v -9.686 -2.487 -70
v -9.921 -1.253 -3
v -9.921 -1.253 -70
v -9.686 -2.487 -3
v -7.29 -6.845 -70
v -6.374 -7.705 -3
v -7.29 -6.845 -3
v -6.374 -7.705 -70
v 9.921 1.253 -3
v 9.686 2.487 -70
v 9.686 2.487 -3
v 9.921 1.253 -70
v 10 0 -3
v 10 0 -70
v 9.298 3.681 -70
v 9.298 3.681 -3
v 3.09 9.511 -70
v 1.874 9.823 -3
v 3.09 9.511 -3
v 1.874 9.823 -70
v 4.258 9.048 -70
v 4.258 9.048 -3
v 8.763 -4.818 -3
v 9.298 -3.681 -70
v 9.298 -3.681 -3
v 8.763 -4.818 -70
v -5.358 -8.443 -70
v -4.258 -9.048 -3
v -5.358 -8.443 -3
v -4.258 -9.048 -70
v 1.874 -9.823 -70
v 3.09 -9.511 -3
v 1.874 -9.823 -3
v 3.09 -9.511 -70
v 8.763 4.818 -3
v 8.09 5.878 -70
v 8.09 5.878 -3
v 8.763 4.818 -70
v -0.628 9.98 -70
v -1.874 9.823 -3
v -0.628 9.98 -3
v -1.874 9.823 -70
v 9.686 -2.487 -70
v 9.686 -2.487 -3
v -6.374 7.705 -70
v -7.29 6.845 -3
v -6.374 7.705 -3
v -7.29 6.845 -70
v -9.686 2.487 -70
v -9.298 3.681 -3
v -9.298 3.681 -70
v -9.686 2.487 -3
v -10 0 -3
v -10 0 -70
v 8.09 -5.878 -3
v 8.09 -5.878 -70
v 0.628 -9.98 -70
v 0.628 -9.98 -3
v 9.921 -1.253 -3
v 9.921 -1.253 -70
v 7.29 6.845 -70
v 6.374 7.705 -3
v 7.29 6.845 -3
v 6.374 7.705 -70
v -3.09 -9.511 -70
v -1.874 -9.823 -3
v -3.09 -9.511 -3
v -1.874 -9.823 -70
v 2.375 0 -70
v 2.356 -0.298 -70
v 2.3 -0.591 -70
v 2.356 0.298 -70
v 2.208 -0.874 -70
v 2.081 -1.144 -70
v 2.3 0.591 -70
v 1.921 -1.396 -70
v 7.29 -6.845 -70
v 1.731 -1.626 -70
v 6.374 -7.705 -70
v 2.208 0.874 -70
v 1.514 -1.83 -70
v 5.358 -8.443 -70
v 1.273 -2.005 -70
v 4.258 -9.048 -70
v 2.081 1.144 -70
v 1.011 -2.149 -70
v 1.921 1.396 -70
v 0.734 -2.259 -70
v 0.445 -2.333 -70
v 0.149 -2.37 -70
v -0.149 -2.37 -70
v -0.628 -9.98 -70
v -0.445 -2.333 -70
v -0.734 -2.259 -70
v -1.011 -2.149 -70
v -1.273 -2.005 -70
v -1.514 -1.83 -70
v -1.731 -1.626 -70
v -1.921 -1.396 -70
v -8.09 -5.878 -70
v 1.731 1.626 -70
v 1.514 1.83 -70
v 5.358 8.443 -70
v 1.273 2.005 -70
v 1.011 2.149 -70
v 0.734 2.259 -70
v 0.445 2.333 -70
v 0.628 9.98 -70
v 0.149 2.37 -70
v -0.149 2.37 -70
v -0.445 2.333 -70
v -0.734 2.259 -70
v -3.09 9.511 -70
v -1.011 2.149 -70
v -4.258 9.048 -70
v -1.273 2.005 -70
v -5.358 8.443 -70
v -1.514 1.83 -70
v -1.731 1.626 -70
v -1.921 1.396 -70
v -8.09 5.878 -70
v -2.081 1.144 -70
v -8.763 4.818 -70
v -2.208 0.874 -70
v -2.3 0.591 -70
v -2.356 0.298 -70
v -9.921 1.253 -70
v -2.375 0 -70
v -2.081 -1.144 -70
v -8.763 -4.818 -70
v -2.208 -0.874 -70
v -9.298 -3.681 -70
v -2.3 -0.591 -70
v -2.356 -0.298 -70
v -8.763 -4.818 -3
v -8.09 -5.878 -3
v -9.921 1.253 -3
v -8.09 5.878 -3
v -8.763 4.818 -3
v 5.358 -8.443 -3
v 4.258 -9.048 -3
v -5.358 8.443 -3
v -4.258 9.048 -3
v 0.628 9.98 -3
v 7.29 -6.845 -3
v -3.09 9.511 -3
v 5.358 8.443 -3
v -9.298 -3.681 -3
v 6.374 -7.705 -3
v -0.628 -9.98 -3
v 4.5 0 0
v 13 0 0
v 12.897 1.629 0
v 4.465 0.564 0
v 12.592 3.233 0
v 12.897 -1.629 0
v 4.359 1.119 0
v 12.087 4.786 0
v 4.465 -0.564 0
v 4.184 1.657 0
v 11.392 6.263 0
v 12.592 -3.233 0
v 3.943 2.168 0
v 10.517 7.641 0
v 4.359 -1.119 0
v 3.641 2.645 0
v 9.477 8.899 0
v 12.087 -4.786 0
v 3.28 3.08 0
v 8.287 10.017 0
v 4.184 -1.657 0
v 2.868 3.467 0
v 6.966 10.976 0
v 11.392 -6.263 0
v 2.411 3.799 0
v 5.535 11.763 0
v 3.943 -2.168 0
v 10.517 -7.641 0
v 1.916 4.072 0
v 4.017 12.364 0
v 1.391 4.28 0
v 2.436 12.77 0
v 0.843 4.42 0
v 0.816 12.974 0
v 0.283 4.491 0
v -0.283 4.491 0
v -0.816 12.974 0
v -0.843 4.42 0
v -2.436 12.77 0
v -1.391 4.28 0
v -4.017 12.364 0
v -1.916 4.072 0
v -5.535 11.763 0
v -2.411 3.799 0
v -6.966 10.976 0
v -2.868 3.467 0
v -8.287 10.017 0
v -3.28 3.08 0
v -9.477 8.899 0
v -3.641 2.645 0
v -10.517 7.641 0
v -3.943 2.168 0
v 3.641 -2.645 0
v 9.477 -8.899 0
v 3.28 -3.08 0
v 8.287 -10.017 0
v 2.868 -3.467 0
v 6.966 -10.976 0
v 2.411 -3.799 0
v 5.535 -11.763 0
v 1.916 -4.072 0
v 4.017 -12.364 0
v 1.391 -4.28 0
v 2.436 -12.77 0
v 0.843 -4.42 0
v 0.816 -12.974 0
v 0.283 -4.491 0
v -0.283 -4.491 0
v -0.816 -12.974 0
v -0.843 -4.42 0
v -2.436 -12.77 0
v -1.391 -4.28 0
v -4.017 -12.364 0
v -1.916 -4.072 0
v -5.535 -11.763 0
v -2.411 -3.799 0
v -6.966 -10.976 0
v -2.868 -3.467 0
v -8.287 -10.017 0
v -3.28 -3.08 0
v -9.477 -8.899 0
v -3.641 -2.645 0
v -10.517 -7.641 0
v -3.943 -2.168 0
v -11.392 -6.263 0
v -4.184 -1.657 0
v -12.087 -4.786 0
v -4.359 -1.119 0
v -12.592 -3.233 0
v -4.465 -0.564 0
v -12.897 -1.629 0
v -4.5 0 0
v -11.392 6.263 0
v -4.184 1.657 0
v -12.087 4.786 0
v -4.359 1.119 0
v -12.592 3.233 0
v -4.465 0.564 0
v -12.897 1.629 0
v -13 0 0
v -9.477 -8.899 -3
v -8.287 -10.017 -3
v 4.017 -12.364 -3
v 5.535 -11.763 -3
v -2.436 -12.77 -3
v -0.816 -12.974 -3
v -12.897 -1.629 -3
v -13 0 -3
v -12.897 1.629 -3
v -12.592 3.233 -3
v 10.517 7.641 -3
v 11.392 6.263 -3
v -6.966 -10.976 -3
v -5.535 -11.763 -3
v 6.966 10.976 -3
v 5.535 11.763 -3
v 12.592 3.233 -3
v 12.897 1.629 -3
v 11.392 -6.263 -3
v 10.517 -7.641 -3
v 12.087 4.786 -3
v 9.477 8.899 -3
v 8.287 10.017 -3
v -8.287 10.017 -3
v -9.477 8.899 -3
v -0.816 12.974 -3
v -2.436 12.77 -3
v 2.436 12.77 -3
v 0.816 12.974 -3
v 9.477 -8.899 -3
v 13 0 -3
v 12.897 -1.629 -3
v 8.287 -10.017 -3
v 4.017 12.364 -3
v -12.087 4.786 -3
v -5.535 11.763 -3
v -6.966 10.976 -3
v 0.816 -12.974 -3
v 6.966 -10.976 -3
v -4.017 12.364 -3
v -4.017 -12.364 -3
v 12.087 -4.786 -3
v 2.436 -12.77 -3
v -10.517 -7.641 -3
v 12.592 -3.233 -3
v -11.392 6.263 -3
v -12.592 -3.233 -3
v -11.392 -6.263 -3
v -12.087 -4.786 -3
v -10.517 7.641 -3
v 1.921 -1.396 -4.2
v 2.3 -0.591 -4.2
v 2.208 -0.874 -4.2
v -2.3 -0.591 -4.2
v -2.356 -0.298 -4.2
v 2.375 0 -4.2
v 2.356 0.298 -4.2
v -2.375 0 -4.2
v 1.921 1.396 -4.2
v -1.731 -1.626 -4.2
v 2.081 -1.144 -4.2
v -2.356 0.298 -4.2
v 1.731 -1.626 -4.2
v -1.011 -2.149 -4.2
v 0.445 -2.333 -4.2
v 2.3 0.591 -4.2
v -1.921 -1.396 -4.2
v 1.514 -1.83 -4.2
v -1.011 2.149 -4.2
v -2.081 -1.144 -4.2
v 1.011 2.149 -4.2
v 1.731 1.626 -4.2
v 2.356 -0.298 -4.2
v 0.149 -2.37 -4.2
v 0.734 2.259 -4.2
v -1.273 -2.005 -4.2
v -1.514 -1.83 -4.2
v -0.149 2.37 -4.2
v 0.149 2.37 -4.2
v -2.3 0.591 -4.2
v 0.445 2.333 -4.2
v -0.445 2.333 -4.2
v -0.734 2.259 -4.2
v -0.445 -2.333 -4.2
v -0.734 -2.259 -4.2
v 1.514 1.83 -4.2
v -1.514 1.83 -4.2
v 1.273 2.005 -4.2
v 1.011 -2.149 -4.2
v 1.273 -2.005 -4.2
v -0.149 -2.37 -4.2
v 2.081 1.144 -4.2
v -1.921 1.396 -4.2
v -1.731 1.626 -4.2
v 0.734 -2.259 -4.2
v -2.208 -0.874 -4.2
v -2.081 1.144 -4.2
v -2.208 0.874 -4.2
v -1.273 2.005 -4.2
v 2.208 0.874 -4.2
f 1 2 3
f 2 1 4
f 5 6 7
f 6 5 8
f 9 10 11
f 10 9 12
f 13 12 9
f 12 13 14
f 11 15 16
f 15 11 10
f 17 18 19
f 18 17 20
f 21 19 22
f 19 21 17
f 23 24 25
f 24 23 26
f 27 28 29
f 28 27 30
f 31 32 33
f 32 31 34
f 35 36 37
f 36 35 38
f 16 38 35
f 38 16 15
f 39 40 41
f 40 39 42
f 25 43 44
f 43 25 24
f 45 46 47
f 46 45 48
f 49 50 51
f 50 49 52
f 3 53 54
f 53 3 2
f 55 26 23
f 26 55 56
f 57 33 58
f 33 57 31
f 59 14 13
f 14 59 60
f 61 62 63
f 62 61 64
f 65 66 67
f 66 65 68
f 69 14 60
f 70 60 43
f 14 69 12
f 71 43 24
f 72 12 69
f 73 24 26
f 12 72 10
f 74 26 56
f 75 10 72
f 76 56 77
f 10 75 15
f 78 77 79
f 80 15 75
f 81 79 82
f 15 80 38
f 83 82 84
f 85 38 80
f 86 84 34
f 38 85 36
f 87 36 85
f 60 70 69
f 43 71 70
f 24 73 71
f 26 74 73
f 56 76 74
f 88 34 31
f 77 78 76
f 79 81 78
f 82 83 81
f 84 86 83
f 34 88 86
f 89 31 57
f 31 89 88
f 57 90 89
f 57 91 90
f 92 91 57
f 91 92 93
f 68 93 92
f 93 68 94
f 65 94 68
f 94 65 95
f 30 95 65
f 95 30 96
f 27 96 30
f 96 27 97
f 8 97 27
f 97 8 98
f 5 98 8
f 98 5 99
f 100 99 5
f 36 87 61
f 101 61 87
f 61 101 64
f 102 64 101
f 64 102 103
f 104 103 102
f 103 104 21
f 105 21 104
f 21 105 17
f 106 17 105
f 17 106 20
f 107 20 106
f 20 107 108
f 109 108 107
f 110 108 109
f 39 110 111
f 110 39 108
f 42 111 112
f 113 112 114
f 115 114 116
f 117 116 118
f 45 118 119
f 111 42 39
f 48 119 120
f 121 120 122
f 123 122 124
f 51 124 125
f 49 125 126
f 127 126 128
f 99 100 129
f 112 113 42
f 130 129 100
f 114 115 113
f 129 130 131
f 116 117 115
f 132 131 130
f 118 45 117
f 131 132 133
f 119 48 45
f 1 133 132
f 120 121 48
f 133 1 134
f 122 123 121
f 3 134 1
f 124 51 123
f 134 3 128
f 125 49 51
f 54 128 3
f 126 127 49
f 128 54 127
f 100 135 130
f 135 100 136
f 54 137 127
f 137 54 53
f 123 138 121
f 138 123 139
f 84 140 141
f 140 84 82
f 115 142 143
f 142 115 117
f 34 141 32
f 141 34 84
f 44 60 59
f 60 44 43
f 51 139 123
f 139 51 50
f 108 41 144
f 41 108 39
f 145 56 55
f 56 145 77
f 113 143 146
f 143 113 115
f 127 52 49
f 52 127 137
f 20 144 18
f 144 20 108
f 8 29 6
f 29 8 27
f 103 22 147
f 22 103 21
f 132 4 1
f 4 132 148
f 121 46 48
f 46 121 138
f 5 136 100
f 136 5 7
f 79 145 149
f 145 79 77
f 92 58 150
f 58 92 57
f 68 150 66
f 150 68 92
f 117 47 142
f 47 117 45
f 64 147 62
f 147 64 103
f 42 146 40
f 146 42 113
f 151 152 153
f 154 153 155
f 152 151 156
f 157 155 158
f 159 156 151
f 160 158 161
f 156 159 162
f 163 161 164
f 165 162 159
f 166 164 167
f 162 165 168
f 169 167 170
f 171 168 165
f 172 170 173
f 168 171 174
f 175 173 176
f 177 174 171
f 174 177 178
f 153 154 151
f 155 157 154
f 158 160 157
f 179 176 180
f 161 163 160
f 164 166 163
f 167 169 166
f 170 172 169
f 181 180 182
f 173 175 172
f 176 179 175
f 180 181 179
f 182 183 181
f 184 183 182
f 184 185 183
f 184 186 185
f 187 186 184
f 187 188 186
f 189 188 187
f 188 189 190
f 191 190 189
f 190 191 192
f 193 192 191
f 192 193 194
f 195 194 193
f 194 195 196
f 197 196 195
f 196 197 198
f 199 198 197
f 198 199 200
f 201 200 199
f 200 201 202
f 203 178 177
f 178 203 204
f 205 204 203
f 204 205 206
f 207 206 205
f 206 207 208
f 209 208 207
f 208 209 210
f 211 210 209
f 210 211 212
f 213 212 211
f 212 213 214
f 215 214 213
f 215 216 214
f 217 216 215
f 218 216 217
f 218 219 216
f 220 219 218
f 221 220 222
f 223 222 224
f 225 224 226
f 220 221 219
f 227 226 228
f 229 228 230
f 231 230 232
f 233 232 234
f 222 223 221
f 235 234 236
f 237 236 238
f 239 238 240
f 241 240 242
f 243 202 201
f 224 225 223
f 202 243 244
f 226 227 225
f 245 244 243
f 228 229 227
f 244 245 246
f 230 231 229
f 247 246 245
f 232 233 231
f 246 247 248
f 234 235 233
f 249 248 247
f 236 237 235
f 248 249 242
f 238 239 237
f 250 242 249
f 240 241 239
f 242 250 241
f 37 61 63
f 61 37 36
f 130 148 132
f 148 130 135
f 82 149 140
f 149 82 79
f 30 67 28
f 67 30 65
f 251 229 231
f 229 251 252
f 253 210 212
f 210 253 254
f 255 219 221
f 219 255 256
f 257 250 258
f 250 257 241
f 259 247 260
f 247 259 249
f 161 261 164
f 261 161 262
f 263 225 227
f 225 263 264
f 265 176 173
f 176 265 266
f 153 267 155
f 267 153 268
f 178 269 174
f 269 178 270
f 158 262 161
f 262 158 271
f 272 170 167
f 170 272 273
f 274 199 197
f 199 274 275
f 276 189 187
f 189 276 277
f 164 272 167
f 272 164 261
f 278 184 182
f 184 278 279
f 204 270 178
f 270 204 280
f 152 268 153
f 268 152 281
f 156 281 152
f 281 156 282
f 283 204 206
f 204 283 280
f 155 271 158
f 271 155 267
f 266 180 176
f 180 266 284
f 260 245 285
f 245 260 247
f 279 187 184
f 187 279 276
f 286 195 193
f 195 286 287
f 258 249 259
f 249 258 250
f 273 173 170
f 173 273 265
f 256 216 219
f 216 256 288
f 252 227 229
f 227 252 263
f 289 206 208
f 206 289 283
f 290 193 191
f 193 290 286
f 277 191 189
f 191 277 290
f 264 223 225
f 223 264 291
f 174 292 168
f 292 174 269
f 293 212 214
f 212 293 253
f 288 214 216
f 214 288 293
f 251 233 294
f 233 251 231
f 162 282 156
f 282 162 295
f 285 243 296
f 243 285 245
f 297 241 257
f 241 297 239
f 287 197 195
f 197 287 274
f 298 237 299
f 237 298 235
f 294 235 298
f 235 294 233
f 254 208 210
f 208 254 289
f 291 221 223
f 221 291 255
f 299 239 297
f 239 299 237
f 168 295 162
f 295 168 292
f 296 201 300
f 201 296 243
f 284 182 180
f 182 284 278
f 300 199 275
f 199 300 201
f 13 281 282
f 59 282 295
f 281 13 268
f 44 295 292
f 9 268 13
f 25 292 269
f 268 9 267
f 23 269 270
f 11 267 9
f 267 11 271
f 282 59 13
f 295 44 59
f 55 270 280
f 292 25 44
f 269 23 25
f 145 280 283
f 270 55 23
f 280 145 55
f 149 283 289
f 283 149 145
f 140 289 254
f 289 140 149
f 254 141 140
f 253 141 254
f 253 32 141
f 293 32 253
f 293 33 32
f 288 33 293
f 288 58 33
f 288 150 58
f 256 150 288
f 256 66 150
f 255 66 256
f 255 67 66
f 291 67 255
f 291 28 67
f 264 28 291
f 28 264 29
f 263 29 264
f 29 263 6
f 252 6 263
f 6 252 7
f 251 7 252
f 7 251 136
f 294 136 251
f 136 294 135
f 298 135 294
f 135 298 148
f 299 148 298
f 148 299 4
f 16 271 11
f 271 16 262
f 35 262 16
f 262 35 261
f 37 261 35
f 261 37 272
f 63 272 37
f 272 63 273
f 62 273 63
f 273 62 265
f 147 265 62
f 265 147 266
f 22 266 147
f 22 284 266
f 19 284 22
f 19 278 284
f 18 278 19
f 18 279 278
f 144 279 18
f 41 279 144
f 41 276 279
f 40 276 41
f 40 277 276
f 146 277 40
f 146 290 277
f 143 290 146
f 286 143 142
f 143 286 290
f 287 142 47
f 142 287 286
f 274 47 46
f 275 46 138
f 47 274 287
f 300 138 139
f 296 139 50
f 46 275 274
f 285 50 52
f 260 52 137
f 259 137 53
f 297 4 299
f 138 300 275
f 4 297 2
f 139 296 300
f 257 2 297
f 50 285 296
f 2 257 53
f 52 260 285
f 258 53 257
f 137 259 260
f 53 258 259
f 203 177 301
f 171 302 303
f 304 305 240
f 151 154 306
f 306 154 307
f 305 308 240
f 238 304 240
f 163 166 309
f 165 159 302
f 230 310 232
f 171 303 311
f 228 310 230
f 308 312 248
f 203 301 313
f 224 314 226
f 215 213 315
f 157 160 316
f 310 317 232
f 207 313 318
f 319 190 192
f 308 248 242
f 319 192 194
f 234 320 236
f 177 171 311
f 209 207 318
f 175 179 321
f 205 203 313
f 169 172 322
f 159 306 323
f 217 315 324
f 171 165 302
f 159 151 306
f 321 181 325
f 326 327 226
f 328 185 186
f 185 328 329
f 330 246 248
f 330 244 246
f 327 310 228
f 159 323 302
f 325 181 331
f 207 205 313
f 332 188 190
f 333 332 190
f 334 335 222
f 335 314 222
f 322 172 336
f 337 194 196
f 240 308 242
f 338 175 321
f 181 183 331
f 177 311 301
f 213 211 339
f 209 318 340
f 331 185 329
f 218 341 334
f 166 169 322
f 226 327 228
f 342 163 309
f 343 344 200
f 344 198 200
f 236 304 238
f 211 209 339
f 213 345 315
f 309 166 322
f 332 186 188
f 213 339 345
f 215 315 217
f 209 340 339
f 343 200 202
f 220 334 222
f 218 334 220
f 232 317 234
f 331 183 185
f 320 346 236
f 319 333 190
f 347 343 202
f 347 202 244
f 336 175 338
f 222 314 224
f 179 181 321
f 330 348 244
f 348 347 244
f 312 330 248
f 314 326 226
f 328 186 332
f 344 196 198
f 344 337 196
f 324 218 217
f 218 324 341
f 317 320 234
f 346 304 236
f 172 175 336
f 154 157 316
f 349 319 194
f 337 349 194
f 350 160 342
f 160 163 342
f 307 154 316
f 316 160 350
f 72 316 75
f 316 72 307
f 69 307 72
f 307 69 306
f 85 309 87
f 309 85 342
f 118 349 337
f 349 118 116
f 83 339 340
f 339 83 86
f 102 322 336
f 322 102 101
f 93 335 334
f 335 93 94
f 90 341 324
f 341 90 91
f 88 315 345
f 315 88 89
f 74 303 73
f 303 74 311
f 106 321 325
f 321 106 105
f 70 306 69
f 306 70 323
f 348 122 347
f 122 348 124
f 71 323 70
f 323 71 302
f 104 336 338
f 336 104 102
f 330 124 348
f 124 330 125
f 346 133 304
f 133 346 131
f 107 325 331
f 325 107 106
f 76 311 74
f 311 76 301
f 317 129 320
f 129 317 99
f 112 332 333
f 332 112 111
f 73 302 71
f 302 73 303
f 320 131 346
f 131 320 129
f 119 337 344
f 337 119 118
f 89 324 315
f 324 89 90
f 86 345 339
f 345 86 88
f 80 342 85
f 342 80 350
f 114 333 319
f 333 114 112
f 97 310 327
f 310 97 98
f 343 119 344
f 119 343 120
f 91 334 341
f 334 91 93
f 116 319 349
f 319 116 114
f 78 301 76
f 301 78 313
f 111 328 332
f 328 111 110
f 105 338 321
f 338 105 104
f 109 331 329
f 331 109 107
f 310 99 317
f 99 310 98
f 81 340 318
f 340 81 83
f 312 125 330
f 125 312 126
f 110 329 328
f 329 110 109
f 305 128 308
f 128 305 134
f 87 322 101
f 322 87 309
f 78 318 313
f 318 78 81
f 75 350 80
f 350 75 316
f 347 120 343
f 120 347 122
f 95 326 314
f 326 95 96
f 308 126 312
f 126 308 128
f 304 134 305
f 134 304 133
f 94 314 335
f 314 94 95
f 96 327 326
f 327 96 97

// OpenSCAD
$fn = 50;


difference() {
	union() {
		translate(v = [0, 0, -70.0000000000]) {
			cylinder(h = 70, r = 10.0000000000);
		}
		translate(v = [0, 0, -3.0000000000]) {
			cylinder(h = 3, r = 13.0000000000);
		}
	}
	union() {
		translate(v = [0, 0, 0]) {
			rotate(a = [0, 0, 0]) {
				difference() {
					union() {
						#translate(v = [0, 0, -70.0000000000]) {
							cylinder(h = 70, r = 2.2500000000);
						}
						#translate(v = [0, 0, -4.2000000000]) {
							cylinder(h = 4.2000000000, r1 = 2.3750000000, r2 = 4.5000000000);
						}
						#translate(v = [0, 0, -70.0000000000]) {
							cylinder(h = 70, r = 2.3750000000);
						}
						#translate(v = [0, 0, -70.0000000000]) {
							cylinder(h = 70, r = 2.2500000000);
						}
					}
					union();
				}
			}
		}
	}
}
